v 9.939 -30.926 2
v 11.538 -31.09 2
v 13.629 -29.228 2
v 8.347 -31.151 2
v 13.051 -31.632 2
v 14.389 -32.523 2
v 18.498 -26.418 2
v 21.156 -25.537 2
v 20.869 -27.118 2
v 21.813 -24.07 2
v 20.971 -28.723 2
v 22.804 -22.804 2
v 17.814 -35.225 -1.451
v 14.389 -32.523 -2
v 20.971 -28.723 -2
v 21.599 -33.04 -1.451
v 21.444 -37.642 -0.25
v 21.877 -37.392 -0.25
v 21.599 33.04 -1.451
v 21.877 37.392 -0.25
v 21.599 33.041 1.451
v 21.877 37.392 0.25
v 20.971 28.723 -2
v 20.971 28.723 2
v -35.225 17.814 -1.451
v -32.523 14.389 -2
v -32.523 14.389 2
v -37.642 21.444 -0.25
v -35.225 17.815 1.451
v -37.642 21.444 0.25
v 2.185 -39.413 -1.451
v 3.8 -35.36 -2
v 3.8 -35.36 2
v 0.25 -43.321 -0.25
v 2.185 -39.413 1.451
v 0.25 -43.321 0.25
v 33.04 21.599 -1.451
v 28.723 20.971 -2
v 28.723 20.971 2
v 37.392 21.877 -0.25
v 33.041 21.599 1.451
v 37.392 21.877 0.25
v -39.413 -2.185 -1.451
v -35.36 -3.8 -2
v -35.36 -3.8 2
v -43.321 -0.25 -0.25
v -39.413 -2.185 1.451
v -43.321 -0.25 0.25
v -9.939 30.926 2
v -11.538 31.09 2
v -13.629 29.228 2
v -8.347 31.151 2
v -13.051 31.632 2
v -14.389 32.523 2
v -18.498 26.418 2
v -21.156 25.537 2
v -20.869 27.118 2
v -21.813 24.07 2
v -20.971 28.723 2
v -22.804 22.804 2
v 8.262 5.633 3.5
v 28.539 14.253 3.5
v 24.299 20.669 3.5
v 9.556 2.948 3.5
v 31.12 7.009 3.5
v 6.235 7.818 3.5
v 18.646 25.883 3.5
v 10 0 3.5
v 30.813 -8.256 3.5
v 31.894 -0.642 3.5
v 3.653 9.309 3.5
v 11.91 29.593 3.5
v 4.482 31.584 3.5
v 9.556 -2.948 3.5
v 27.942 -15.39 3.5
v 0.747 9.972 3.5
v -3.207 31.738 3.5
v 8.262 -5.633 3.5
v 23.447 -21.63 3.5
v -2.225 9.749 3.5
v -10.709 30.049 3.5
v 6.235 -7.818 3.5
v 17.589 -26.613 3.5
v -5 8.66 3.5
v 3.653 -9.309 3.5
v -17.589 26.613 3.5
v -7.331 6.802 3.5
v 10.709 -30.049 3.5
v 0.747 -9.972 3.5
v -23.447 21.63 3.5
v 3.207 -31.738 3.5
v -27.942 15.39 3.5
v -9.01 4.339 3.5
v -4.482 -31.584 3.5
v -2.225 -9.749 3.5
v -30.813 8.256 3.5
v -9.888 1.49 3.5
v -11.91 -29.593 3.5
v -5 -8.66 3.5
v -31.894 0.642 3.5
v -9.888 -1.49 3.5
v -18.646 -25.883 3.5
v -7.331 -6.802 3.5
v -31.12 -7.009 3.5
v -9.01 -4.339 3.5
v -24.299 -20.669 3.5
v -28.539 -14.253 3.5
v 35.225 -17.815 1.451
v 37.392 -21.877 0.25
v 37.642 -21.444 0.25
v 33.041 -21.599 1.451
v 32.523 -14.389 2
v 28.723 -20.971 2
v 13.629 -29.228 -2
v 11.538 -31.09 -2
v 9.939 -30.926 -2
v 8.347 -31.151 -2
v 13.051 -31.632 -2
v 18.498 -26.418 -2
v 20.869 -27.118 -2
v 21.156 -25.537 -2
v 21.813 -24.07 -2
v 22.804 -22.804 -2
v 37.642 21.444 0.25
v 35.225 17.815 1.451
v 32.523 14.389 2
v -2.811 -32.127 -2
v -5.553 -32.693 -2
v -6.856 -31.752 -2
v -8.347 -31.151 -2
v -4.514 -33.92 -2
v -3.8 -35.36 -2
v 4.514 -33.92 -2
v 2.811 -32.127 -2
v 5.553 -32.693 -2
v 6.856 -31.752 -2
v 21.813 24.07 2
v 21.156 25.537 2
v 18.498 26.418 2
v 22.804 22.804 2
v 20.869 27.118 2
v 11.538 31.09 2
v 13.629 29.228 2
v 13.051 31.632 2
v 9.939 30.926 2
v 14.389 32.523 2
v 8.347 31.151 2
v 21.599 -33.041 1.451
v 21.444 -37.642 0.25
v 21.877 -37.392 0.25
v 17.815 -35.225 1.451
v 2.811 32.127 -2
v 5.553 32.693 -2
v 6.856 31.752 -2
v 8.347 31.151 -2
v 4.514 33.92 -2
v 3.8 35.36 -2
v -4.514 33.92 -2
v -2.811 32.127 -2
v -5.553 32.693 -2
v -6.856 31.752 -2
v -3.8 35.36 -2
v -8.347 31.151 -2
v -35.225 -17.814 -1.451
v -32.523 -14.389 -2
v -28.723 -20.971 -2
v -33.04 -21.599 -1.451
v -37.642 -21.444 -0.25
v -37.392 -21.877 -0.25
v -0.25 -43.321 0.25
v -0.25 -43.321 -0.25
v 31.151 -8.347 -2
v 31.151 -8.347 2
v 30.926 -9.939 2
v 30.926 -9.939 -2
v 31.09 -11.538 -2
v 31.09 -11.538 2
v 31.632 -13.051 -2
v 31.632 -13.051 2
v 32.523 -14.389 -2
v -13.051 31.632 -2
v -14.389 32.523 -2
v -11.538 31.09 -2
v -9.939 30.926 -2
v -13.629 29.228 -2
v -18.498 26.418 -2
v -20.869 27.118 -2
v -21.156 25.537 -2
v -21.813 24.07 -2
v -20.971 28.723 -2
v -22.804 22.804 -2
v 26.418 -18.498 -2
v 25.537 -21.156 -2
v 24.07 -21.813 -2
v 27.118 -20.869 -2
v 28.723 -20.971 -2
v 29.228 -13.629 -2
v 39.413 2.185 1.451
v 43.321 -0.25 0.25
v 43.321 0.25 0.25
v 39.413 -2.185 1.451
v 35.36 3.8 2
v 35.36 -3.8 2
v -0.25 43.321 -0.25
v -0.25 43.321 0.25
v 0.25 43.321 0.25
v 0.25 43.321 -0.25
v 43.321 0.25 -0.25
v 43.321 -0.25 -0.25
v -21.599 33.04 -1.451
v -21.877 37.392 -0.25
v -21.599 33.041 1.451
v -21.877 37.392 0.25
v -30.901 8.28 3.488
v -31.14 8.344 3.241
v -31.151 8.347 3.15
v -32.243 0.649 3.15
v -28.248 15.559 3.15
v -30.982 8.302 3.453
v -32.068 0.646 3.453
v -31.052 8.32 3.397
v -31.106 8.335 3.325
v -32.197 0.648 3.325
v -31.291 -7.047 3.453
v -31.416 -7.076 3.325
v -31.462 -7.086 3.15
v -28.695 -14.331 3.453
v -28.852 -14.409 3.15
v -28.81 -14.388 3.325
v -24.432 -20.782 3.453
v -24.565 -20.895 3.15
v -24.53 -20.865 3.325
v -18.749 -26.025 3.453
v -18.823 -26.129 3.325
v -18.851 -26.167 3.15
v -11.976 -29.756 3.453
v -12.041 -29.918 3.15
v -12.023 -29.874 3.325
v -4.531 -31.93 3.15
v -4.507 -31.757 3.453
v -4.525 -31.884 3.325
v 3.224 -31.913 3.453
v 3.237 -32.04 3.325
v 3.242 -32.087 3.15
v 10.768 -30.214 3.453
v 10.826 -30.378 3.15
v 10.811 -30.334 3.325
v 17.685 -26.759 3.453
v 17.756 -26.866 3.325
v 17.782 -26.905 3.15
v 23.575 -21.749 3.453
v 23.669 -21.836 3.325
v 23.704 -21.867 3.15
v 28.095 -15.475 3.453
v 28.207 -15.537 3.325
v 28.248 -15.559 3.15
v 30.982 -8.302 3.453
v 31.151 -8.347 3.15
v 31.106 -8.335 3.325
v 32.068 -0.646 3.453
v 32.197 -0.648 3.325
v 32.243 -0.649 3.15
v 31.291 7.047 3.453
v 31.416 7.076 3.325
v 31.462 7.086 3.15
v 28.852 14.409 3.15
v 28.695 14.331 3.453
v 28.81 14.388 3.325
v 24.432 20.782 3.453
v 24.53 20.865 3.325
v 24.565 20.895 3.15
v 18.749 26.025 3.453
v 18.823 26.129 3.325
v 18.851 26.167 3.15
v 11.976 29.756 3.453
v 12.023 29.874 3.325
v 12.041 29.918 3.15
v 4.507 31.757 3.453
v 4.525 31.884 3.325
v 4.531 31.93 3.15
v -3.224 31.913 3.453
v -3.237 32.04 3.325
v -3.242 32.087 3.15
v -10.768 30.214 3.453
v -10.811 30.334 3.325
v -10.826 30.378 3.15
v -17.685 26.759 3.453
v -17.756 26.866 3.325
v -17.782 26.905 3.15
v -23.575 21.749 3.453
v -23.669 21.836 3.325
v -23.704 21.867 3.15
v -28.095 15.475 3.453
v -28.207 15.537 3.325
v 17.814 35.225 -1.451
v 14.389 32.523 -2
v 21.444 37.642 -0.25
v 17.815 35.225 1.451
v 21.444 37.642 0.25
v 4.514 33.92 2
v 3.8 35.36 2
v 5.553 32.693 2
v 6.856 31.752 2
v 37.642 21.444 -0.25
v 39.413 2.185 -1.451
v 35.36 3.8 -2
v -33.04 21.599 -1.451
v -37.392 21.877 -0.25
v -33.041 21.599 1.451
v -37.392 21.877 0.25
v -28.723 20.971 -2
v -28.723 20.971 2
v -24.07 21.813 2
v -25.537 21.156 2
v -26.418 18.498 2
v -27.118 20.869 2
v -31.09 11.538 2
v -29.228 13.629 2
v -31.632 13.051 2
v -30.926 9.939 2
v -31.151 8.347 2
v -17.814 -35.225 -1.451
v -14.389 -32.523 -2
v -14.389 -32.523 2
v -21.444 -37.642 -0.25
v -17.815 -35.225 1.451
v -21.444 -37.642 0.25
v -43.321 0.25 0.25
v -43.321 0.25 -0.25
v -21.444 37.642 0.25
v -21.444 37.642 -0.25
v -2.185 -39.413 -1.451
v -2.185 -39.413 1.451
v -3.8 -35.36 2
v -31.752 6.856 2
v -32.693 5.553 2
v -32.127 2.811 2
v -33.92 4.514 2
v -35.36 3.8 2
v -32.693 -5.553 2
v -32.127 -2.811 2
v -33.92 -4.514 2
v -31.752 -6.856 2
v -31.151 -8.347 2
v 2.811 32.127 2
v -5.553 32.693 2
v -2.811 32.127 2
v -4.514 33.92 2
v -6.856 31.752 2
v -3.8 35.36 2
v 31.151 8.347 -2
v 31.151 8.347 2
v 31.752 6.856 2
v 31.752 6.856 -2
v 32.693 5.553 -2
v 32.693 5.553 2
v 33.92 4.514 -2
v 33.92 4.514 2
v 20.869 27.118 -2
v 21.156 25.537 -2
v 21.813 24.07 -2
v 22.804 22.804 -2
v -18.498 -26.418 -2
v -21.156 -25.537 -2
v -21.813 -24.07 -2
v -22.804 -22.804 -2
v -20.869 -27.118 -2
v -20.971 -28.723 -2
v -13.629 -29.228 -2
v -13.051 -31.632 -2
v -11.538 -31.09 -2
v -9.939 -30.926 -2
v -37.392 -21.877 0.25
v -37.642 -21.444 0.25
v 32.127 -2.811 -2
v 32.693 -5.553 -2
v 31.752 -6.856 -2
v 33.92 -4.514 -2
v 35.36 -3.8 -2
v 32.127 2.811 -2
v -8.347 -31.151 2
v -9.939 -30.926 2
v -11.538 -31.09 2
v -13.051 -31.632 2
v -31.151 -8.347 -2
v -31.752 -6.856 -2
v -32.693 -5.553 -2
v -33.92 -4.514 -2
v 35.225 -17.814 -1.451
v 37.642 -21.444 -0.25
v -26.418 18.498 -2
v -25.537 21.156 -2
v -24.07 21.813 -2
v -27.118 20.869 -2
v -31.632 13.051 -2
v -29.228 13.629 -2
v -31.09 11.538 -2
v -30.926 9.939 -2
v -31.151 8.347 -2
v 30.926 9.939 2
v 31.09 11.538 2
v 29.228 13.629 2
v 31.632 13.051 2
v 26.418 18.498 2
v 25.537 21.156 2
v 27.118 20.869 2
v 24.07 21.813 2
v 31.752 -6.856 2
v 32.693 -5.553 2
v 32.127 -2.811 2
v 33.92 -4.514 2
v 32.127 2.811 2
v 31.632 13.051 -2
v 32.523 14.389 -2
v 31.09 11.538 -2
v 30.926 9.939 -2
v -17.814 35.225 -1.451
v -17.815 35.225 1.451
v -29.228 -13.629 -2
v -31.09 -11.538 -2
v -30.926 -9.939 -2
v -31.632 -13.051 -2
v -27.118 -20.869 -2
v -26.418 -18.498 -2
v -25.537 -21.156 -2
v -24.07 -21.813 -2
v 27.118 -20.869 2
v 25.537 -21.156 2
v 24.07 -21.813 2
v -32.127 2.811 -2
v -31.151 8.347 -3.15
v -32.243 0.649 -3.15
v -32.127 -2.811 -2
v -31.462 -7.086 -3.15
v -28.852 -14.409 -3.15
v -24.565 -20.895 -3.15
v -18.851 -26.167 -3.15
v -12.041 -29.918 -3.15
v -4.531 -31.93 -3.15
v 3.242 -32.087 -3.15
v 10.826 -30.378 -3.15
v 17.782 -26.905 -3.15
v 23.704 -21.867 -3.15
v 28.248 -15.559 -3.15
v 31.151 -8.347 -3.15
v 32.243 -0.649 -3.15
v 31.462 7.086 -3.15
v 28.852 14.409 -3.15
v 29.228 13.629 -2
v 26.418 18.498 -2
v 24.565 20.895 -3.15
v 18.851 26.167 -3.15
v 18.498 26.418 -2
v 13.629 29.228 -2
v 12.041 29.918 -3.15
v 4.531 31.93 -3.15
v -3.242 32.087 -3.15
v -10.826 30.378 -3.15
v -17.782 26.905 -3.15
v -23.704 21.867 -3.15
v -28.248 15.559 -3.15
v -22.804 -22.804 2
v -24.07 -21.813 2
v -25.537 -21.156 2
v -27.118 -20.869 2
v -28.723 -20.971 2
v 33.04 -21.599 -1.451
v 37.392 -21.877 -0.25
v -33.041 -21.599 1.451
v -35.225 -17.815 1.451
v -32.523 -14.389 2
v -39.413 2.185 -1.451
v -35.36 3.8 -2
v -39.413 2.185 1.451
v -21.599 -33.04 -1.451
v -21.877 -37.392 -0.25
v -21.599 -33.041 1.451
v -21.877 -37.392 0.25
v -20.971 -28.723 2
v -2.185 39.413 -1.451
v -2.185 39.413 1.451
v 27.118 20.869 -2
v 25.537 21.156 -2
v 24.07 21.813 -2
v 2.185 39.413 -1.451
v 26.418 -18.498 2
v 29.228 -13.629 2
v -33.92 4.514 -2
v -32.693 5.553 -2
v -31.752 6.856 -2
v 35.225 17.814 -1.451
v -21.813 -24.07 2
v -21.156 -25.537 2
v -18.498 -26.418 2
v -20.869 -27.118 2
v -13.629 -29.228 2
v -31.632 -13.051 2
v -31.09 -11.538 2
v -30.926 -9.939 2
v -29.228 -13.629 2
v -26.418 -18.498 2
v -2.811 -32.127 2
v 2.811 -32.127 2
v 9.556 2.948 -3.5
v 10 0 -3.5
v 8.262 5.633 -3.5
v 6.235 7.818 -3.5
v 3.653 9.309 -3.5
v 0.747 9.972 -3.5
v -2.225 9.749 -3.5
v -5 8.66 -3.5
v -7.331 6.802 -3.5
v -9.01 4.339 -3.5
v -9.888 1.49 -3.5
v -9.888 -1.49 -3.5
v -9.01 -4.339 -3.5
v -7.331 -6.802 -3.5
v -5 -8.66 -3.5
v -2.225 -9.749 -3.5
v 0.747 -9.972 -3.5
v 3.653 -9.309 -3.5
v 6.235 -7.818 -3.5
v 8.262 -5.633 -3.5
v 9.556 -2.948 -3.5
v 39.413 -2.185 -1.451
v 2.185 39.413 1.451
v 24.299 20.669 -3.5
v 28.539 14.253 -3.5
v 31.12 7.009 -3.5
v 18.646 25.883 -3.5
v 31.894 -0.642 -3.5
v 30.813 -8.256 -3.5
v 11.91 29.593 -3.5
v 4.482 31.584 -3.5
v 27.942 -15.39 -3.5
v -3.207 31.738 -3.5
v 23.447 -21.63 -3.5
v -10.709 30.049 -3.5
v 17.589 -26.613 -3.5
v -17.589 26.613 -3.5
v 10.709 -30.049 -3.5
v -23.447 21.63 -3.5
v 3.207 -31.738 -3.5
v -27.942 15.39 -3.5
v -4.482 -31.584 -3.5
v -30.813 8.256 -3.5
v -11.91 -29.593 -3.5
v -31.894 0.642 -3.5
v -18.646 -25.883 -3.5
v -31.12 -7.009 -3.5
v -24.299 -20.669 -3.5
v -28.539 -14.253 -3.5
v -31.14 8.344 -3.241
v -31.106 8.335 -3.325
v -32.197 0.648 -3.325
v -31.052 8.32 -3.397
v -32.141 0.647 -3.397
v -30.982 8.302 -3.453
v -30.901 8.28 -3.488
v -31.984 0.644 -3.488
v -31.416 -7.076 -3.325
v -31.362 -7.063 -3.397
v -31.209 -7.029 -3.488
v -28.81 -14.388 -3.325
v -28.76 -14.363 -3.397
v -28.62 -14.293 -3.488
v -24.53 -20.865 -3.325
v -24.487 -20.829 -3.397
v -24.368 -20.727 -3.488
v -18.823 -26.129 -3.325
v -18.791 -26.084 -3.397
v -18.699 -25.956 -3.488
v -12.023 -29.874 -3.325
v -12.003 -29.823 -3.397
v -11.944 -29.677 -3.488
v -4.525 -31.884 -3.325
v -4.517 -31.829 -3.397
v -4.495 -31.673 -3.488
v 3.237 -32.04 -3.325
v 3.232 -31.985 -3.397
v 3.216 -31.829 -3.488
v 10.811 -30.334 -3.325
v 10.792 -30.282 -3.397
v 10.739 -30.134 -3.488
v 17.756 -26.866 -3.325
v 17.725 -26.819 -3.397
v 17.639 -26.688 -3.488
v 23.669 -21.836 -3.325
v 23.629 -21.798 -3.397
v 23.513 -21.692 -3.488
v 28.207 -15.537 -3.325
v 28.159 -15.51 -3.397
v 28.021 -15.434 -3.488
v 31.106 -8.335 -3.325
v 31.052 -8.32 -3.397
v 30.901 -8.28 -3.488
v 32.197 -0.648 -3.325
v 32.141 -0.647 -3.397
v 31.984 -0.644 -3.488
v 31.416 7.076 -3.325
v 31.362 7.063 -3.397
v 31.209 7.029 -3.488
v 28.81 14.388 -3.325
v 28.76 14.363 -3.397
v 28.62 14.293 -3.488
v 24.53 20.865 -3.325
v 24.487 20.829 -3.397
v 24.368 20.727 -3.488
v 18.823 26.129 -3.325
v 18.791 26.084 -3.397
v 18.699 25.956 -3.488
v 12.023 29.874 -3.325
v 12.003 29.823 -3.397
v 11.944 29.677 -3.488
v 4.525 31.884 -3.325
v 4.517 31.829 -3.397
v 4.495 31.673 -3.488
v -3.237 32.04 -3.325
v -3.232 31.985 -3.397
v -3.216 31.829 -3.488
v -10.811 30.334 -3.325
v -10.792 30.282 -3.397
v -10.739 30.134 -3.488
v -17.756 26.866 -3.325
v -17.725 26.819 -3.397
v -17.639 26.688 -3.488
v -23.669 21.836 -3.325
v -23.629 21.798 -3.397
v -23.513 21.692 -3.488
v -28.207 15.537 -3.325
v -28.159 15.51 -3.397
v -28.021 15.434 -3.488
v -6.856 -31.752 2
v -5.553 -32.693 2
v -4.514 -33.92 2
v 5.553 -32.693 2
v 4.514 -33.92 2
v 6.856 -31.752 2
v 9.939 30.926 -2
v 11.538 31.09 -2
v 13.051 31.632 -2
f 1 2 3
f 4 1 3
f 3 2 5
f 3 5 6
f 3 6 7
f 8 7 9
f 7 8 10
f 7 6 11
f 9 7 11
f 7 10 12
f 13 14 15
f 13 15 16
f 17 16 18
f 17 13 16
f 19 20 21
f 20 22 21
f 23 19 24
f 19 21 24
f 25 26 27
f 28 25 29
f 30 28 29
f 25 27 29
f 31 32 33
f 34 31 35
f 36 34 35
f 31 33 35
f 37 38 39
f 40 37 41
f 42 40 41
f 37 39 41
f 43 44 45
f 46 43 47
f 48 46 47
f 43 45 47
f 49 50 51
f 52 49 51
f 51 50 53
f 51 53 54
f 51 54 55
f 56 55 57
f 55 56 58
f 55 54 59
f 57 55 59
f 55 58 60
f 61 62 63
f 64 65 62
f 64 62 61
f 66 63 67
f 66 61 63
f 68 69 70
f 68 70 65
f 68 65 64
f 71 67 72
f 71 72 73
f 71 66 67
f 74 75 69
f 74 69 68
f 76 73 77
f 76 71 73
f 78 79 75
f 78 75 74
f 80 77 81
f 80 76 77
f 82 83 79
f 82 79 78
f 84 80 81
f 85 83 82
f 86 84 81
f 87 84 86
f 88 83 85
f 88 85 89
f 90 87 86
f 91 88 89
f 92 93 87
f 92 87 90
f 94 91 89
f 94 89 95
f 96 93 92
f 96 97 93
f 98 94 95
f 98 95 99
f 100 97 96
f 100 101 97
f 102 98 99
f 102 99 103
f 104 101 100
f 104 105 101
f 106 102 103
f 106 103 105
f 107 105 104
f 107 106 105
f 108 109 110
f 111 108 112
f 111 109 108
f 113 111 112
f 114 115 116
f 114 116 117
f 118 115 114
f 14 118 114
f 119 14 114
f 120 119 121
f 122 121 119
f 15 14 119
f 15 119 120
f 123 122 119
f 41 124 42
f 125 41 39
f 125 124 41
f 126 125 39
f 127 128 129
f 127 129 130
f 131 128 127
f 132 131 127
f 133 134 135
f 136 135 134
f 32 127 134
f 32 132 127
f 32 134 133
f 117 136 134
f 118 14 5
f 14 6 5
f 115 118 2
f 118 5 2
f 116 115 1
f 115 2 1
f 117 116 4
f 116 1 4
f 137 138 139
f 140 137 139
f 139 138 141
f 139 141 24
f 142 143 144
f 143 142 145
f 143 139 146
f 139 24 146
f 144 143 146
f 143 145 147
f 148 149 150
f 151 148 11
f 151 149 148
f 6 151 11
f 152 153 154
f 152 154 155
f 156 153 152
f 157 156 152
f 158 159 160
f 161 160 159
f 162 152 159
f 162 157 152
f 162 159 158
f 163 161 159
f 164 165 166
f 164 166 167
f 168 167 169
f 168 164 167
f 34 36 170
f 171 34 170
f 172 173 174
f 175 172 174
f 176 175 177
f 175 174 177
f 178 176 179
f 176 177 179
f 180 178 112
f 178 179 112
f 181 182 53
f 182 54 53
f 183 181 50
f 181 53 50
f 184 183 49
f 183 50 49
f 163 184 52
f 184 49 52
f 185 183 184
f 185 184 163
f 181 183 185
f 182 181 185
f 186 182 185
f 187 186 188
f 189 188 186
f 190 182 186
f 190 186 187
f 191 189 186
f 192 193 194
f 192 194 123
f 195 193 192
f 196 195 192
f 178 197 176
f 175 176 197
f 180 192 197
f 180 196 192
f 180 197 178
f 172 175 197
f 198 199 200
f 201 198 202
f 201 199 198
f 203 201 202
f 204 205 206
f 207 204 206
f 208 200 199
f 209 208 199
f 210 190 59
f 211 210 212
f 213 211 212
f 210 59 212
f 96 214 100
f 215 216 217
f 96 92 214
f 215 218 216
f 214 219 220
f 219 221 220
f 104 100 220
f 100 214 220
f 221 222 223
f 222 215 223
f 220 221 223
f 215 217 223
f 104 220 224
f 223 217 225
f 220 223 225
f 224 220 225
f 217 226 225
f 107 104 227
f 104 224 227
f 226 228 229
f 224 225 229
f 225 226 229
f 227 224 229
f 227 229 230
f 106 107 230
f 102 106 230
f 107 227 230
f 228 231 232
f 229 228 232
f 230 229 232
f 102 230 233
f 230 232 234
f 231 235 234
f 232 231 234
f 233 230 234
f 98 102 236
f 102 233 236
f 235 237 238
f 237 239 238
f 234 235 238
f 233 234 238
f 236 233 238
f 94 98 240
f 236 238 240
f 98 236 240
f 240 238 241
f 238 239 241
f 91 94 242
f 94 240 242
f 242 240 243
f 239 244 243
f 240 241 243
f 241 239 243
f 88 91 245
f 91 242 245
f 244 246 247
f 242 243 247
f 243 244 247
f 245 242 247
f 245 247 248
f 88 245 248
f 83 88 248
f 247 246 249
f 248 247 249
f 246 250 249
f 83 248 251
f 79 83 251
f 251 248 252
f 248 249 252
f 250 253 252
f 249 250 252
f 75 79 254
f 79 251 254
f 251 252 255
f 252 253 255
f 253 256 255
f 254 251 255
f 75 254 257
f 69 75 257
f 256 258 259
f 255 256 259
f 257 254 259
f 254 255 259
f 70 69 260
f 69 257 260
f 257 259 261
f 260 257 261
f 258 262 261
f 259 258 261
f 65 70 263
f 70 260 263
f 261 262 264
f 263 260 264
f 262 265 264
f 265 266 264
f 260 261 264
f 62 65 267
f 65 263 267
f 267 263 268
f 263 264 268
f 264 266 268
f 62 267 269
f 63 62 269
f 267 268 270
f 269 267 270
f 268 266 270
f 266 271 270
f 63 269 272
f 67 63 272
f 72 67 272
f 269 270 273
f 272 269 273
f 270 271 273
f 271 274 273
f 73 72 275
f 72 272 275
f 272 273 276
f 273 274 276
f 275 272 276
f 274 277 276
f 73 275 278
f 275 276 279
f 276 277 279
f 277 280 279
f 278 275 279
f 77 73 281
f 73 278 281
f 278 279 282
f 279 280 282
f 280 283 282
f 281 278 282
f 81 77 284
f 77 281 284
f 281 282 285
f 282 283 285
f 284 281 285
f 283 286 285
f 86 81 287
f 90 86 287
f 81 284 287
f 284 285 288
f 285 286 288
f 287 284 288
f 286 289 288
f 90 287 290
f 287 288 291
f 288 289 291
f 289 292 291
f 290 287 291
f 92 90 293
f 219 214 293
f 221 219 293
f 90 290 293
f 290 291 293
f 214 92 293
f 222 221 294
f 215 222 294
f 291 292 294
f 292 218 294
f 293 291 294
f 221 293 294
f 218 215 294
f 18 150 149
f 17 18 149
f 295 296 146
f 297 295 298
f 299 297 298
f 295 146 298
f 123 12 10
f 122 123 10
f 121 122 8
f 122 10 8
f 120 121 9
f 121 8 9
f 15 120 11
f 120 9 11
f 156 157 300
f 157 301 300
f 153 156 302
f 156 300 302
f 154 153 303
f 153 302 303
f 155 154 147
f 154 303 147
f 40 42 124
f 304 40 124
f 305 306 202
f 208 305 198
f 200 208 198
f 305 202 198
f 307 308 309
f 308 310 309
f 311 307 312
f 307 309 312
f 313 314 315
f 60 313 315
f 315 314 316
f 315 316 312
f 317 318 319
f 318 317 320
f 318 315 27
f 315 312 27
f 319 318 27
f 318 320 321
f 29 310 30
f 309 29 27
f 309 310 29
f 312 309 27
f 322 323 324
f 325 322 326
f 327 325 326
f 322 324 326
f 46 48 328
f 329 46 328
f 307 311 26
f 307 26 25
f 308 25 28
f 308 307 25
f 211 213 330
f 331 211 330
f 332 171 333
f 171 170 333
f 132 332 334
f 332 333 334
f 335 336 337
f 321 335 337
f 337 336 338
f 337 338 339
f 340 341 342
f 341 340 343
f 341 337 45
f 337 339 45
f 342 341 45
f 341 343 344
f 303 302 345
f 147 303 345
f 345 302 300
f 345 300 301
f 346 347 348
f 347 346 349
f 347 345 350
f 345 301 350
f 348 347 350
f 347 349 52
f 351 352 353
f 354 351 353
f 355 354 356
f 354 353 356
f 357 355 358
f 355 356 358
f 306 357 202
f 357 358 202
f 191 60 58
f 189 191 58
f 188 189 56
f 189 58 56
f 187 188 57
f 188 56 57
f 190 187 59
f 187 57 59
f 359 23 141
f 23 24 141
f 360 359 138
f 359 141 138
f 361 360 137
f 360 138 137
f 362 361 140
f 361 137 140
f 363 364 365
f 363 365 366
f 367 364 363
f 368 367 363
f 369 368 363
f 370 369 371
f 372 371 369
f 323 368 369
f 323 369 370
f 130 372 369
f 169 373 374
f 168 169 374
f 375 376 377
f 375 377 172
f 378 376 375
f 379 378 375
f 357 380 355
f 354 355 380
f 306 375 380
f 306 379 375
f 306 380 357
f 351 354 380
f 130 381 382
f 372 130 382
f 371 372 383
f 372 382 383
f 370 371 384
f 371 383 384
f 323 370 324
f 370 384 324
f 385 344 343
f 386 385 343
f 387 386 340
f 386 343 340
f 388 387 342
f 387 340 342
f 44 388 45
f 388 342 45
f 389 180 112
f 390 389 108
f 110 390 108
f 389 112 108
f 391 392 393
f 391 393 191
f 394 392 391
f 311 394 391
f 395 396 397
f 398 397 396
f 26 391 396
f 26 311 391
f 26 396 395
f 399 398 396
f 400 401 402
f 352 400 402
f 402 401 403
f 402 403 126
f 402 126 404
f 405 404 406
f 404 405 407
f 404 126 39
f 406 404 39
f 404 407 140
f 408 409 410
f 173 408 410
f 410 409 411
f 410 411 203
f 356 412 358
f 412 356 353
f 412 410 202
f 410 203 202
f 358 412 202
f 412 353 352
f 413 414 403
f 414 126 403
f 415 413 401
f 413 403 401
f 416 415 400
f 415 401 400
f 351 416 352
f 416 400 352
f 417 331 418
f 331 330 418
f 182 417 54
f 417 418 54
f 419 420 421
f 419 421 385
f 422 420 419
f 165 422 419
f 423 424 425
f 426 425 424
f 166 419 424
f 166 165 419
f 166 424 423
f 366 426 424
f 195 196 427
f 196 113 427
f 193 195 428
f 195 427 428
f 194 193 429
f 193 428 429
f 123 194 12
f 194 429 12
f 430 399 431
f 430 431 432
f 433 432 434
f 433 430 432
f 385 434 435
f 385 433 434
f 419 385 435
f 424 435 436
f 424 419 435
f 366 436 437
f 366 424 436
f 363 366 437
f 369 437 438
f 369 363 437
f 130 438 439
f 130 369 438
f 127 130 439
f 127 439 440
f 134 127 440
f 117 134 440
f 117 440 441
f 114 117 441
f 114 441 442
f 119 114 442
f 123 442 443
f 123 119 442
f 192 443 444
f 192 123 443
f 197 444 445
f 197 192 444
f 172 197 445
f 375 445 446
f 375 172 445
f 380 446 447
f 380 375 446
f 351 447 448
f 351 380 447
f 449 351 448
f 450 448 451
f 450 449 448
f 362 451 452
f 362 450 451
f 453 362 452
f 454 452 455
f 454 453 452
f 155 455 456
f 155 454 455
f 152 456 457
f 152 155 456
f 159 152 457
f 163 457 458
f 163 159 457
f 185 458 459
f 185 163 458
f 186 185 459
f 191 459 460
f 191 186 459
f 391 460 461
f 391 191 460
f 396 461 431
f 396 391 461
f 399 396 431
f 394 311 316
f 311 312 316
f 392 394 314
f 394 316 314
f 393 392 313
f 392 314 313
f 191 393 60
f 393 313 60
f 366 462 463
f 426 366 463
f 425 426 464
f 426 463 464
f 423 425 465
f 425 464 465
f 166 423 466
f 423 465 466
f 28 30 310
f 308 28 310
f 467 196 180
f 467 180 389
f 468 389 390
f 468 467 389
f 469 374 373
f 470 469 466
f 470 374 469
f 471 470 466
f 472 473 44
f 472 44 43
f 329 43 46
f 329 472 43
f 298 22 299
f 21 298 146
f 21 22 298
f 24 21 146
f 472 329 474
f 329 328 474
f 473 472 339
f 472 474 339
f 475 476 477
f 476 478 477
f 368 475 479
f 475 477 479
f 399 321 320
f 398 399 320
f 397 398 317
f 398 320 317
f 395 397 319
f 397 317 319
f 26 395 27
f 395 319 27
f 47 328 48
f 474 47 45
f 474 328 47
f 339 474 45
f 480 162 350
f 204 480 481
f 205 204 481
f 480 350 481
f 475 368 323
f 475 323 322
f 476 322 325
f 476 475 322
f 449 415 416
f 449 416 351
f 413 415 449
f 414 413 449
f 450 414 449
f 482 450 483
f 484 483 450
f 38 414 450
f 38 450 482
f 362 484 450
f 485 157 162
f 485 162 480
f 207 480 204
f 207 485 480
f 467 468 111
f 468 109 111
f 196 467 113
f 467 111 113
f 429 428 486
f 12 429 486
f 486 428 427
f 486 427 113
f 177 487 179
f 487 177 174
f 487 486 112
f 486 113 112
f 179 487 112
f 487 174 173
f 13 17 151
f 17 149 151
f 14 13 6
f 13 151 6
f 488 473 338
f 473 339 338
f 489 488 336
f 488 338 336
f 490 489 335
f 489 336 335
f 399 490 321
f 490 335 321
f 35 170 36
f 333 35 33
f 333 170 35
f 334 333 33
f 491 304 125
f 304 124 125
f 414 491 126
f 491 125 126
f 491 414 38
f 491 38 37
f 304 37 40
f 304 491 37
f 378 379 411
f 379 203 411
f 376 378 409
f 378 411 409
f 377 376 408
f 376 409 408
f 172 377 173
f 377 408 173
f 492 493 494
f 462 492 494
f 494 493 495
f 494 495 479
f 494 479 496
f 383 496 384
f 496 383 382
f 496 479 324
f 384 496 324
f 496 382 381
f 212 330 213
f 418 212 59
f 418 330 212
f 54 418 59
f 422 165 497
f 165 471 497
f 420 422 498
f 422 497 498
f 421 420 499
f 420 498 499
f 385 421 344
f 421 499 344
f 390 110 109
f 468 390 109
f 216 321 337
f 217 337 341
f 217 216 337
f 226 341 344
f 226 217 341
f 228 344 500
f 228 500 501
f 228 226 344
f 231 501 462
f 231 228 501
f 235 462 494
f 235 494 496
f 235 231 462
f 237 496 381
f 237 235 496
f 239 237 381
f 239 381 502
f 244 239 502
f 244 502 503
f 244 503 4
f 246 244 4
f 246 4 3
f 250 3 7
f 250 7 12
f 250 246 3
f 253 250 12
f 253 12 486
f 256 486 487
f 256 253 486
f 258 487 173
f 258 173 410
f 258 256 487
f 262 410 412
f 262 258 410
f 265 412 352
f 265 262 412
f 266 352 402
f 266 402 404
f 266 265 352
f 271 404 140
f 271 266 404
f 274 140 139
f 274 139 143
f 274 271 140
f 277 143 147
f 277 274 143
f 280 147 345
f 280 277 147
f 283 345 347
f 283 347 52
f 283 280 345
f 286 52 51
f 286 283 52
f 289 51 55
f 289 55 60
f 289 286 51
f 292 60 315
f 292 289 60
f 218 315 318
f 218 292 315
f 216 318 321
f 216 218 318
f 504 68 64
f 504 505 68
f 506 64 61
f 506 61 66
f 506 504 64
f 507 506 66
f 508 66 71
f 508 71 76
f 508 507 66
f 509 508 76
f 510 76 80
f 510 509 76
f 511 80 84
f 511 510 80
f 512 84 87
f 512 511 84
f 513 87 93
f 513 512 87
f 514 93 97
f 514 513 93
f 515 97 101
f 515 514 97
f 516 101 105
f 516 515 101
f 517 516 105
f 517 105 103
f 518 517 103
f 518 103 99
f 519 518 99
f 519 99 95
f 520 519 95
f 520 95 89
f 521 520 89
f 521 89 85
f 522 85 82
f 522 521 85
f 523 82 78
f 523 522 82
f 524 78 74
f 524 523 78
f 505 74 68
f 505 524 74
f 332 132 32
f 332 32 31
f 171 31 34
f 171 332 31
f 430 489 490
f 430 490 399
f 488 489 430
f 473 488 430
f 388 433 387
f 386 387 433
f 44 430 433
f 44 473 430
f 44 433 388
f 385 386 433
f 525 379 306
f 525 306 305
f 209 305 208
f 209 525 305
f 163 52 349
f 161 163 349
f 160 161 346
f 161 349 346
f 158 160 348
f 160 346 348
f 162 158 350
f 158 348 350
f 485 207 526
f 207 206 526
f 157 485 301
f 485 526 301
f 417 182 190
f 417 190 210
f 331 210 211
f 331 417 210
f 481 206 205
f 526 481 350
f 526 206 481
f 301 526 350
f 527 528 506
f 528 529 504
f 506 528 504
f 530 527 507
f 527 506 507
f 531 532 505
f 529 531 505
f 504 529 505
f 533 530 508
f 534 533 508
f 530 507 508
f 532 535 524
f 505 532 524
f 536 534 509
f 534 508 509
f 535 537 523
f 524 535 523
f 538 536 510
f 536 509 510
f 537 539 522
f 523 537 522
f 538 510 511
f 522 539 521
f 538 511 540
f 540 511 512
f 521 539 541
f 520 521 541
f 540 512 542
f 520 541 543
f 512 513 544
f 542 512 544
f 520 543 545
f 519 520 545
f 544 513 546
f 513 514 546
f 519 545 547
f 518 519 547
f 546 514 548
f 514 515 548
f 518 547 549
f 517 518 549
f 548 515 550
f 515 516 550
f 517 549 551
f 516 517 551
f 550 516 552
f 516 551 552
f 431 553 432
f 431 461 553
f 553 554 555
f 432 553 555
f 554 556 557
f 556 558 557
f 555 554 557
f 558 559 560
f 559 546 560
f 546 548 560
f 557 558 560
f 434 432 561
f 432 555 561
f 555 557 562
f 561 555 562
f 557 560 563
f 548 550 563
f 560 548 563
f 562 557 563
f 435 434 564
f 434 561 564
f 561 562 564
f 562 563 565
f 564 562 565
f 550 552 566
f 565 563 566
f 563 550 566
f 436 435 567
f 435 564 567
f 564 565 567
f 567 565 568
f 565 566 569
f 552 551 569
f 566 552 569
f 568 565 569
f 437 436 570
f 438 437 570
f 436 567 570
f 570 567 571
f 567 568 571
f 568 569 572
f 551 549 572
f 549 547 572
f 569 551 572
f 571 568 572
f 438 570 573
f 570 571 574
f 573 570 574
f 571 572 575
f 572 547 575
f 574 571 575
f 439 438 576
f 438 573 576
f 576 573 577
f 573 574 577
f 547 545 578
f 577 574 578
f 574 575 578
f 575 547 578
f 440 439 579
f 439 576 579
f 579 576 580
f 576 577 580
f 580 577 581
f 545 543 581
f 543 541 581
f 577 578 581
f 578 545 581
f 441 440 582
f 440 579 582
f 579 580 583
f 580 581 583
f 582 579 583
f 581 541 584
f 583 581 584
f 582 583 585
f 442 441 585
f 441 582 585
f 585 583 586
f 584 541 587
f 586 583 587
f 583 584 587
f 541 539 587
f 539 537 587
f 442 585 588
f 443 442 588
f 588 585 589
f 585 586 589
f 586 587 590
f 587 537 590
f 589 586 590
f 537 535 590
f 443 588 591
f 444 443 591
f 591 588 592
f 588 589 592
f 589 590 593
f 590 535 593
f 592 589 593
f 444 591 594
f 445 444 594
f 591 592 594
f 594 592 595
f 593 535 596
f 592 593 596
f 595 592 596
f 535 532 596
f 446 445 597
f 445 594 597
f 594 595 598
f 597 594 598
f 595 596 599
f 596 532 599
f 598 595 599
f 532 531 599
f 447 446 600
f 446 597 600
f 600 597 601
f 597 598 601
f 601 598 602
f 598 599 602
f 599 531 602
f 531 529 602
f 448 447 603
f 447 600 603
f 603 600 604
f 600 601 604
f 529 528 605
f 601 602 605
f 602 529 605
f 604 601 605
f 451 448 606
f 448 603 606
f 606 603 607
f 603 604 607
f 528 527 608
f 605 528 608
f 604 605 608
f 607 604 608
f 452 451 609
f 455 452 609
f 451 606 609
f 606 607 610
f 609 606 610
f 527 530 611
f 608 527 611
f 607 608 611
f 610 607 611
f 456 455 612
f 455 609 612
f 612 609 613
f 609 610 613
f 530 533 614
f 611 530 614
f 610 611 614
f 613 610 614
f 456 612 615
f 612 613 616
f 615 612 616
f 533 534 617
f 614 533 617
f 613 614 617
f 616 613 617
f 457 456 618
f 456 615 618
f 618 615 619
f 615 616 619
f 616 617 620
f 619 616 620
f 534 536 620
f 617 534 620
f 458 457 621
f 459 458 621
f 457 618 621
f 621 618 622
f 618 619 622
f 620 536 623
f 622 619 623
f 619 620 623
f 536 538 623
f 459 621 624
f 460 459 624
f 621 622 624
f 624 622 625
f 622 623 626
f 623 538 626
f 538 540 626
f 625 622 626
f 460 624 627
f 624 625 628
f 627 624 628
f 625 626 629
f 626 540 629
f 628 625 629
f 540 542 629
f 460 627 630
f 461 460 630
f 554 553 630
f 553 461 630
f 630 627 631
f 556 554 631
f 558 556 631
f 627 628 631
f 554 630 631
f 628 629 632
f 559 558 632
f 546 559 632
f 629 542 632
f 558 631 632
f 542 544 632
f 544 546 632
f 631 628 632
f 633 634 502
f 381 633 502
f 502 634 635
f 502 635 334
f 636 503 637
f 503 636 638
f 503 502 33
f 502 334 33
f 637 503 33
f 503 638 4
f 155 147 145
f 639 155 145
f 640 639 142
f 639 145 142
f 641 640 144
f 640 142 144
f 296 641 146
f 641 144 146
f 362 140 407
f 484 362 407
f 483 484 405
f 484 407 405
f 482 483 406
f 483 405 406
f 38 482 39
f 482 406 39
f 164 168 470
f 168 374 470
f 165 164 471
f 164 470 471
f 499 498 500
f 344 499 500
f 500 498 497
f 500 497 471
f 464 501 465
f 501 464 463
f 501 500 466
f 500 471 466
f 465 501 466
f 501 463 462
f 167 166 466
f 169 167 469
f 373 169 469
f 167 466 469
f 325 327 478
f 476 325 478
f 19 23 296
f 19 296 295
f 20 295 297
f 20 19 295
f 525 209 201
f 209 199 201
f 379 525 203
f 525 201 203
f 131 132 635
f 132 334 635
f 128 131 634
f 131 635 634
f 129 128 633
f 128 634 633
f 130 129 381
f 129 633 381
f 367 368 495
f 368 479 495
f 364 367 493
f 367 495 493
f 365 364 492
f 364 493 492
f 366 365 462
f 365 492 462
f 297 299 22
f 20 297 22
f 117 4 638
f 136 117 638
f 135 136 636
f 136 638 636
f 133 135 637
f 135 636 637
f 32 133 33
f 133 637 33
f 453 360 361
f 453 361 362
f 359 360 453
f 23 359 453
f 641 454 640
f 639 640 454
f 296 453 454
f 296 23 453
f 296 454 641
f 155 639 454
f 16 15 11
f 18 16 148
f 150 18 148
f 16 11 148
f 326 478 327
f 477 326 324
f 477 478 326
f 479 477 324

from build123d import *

# Parameters (mm, degrees)
EXTRUDE_1_DEPTH          = 2
CUT_EXTRUDE_1_DEPTH      = 6
PATTERN_CIRCULAR_1_COUNT = 12
SKETCH_6_R               = 32.25
SKETCH_6_R_2             = 10
EXTRUDE_2_DEPTH          = 3.5
FILLET_1_R               = 0.35


with BuildPart() as part:
    # Эскиз4 → Бобышка-Вытянуть1 (new, symmetric)
    with BuildSketch(Plane.XY):
        with BuildLine():
            Line((-0.25, 43.320508076), (0.25, 43.320508076))
            ThreePointArc((0.25, 43.320508076), (2.185336575, 39.411779528), (3.8, 35.360045512))
            ThreePointArc((3.8, 35.360045512), (5.552858836, 32.693174534), (8.346914205, 31.151107898))
            ThreePointArc((8.346914205, 31.151107898), (0, 32.25), (-8.346914205, 31.151107898))
            ThreePointArc((-8.346914205, 31.151107898), (-5.552858836, 32.693174534), (-3.8, 35.360045512))
            ThreePointArc((-3.8, 35.360045512), (-2.185336575, 39.411779528), (-0.25, 43.320508076))
        make_face()
    extrude(amount=EXTRUDE_1_DEPTH, both=True)

    # Эскиз5 → Вырез-Вытянуть1 (cut, symmetric)
    with BuildSketch(Plane(origin=(0, 0, 0), x_dir=(0, 0, -1), z_dir=(1, 0, 0))):
        with BuildLine():
            Line((-2, 35.360045512), (-3, 35.360045512))
            Line((-3, 35.360045512), (-3, 44.320508076))
            Line((-3, 44.320508076), (3, 44.320508076))
            Line((3, 44.320508076), (3, 35.360045512))
            Line((3, 35.360045512), (2, 35.360045512))
            ThreePointArc((2, 35.360045512), (1.451594964, 39.412074278), (0.25, 43.320508076))
            Line((0.25, 43.320508076), (-0.25, 43.320508076))
            ThreePointArc((-0.25, 43.320508076), (-1.451594964, 39.412074278), (-2, 35.360045512))
        make_face()
    extrude(amount=CUT_EXTRUDE_1_DEPTH, both=True, mode=Mode.SUBTRACT)


with BuildPart() as pattern_circular_1_1:
    # Круговой массив1: pattern copy
    add(part.part.rotate(Axis((0, 0, 0), (0, 0, 1)), 1 * 360 / PATTERN_CIRCULAR_1_COUNT))


with BuildPart() as pattern_circular_1_2:
    # Круговой массив1: pattern copy
    add(part.part.rotate(Axis((0, 0, 0), (0, 0, 1)), 2 * 360 / PATTERN_CIRCULAR_1_COUNT))


with BuildPart() as pattern_circular_1_3:
    # Круговой массив1: pattern copy
    add(part.part.rotate(Axis((0, 0, 0), (0, 0, 1)), 3 * 360 / PATTERN_CIRCULAR_1_COUNT))


with BuildPart() as pattern_circular_1_4:
    # Круговой массив1: pattern copy
    add(part.part.rotate(Axis((0, 0, 0), (0, 0, 1)), 4 * 360 / PATTERN_CIRCULAR_1_COUNT))


with BuildPart() as pattern_circular_1_5:
    # Круговой массив1: pattern copy
    add(part.part.rotate(Axis((0, 0, 0), (0, 0, 1)), 5 * 360 / PATTERN_CIRCULAR_1_COUNT))


with BuildPart() as pattern_circular_1_6:
    # Круговой массив1: pattern copy
    add(part.part.rotate(Axis((0, 0, 0), (0, 0, 1)), 6 * 360 / PATTERN_CIRCULAR_1_COUNT))


with BuildPart() as pattern_circular_1_7:
    # Круговой массив1: pattern copy
    add(part.part.rotate(Axis((0, 0, 0), (0, 0, 1)), 7 * 360 / PATTERN_CIRCULAR_1_COUNT))


with BuildPart() as pattern_circular_1_8:
    # Круговой массив1: pattern copy
    add(part.part.rotate(Axis((0, 0, 0), (0, 0, 1)), 8 * 360 / PATTERN_CIRCULAR_1_COUNT))


with BuildPart() as pattern_circular_1_9:
    # Круговой массив1: pattern copy
    add(part.part.rotate(Axis((0, 0, 0), (0, 0, 1)), 9 * 360 / PATTERN_CIRCULAR_1_COUNT))


with BuildPart() as pattern_circular_1_10:
    # Круговой массив1: pattern copy
    add(part.part.rotate(Axis((0, 0, 0), (0, 0, 1)), 10 * 360 / PATTERN_CIRCULAR_1_COUNT))


with BuildPart() as pattern_circular_1_11:
    # Круговой массив1: pattern copy
    add(part.part.rotate(Axis((0, 0, 0), (0, 0, 1)), 11 * 360 / PATTERN_CIRCULAR_1_COUNT))


with BuildPart() as part_1:
    add(part.part)

    add(pattern_circular_1_1.part)  # Бобышка-Вытянуть2 merges Круговой массив1_1

    add(pattern_circular_1_2.part)  # Бобышка-Вытянуть2 merges Круговой массив1_2

    add(pattern_circular_1_3.part)  # Бобышка-Вытянуть2 merges Круговой массив1_3

    add(pattern_circular_1_4.part)  # Бобышка-Вытянуть2 merges Круговой массив1_4

    add(pattern_circular_1_5.part)  # Бобышка-Вытянуть2 merges Круговой массив1_5

    add(pattern_circular_1_6.part)  # Бобышка-Вытянуть2 merges Круговой массив1_6

    add(pattern_circular_1_7.part)  # Бобышка-Вытянуть2 merges Круговой массив1_7

    add(pattern_circular_1_8.part)  # Бобышка-Вытянуть2 merges Круговой массив1_8

    add(pattern_circular_1_9.part)  # Бобышка-Вытянуть2 merges Круговой массив1_9

    add(pattern_circular_1_10.part)  # Бобышка-Вытянуть2 merges Круговой массив1_10

    add(pattern_circular_1_11.part)  # Бобышка-Вытянуть2 merges Круговой массив1_11
    # Эскиз6 → Бобышка-Вытянуть2 (add, symmetric)
    with BuildSketch(Plane.XY):
        Circle(SKETCH_6_R)
        Circle(SKETCH_6_R_2, mode=Mode.SUBTRACT)
    extrude(amount=EXTRUDE_2_DEPTH, both=True)

    # Скругление1
    fillet_1_edges = [part_1.edges().sort_by_distance(p)[0] for p in [
        (-32.25, 0, -3.5),
        (-32.25, 0, 3.5),
    ]]
    fillet(fillet_1_edges, radius=FILLET_1_R)


solid = part_1.part
